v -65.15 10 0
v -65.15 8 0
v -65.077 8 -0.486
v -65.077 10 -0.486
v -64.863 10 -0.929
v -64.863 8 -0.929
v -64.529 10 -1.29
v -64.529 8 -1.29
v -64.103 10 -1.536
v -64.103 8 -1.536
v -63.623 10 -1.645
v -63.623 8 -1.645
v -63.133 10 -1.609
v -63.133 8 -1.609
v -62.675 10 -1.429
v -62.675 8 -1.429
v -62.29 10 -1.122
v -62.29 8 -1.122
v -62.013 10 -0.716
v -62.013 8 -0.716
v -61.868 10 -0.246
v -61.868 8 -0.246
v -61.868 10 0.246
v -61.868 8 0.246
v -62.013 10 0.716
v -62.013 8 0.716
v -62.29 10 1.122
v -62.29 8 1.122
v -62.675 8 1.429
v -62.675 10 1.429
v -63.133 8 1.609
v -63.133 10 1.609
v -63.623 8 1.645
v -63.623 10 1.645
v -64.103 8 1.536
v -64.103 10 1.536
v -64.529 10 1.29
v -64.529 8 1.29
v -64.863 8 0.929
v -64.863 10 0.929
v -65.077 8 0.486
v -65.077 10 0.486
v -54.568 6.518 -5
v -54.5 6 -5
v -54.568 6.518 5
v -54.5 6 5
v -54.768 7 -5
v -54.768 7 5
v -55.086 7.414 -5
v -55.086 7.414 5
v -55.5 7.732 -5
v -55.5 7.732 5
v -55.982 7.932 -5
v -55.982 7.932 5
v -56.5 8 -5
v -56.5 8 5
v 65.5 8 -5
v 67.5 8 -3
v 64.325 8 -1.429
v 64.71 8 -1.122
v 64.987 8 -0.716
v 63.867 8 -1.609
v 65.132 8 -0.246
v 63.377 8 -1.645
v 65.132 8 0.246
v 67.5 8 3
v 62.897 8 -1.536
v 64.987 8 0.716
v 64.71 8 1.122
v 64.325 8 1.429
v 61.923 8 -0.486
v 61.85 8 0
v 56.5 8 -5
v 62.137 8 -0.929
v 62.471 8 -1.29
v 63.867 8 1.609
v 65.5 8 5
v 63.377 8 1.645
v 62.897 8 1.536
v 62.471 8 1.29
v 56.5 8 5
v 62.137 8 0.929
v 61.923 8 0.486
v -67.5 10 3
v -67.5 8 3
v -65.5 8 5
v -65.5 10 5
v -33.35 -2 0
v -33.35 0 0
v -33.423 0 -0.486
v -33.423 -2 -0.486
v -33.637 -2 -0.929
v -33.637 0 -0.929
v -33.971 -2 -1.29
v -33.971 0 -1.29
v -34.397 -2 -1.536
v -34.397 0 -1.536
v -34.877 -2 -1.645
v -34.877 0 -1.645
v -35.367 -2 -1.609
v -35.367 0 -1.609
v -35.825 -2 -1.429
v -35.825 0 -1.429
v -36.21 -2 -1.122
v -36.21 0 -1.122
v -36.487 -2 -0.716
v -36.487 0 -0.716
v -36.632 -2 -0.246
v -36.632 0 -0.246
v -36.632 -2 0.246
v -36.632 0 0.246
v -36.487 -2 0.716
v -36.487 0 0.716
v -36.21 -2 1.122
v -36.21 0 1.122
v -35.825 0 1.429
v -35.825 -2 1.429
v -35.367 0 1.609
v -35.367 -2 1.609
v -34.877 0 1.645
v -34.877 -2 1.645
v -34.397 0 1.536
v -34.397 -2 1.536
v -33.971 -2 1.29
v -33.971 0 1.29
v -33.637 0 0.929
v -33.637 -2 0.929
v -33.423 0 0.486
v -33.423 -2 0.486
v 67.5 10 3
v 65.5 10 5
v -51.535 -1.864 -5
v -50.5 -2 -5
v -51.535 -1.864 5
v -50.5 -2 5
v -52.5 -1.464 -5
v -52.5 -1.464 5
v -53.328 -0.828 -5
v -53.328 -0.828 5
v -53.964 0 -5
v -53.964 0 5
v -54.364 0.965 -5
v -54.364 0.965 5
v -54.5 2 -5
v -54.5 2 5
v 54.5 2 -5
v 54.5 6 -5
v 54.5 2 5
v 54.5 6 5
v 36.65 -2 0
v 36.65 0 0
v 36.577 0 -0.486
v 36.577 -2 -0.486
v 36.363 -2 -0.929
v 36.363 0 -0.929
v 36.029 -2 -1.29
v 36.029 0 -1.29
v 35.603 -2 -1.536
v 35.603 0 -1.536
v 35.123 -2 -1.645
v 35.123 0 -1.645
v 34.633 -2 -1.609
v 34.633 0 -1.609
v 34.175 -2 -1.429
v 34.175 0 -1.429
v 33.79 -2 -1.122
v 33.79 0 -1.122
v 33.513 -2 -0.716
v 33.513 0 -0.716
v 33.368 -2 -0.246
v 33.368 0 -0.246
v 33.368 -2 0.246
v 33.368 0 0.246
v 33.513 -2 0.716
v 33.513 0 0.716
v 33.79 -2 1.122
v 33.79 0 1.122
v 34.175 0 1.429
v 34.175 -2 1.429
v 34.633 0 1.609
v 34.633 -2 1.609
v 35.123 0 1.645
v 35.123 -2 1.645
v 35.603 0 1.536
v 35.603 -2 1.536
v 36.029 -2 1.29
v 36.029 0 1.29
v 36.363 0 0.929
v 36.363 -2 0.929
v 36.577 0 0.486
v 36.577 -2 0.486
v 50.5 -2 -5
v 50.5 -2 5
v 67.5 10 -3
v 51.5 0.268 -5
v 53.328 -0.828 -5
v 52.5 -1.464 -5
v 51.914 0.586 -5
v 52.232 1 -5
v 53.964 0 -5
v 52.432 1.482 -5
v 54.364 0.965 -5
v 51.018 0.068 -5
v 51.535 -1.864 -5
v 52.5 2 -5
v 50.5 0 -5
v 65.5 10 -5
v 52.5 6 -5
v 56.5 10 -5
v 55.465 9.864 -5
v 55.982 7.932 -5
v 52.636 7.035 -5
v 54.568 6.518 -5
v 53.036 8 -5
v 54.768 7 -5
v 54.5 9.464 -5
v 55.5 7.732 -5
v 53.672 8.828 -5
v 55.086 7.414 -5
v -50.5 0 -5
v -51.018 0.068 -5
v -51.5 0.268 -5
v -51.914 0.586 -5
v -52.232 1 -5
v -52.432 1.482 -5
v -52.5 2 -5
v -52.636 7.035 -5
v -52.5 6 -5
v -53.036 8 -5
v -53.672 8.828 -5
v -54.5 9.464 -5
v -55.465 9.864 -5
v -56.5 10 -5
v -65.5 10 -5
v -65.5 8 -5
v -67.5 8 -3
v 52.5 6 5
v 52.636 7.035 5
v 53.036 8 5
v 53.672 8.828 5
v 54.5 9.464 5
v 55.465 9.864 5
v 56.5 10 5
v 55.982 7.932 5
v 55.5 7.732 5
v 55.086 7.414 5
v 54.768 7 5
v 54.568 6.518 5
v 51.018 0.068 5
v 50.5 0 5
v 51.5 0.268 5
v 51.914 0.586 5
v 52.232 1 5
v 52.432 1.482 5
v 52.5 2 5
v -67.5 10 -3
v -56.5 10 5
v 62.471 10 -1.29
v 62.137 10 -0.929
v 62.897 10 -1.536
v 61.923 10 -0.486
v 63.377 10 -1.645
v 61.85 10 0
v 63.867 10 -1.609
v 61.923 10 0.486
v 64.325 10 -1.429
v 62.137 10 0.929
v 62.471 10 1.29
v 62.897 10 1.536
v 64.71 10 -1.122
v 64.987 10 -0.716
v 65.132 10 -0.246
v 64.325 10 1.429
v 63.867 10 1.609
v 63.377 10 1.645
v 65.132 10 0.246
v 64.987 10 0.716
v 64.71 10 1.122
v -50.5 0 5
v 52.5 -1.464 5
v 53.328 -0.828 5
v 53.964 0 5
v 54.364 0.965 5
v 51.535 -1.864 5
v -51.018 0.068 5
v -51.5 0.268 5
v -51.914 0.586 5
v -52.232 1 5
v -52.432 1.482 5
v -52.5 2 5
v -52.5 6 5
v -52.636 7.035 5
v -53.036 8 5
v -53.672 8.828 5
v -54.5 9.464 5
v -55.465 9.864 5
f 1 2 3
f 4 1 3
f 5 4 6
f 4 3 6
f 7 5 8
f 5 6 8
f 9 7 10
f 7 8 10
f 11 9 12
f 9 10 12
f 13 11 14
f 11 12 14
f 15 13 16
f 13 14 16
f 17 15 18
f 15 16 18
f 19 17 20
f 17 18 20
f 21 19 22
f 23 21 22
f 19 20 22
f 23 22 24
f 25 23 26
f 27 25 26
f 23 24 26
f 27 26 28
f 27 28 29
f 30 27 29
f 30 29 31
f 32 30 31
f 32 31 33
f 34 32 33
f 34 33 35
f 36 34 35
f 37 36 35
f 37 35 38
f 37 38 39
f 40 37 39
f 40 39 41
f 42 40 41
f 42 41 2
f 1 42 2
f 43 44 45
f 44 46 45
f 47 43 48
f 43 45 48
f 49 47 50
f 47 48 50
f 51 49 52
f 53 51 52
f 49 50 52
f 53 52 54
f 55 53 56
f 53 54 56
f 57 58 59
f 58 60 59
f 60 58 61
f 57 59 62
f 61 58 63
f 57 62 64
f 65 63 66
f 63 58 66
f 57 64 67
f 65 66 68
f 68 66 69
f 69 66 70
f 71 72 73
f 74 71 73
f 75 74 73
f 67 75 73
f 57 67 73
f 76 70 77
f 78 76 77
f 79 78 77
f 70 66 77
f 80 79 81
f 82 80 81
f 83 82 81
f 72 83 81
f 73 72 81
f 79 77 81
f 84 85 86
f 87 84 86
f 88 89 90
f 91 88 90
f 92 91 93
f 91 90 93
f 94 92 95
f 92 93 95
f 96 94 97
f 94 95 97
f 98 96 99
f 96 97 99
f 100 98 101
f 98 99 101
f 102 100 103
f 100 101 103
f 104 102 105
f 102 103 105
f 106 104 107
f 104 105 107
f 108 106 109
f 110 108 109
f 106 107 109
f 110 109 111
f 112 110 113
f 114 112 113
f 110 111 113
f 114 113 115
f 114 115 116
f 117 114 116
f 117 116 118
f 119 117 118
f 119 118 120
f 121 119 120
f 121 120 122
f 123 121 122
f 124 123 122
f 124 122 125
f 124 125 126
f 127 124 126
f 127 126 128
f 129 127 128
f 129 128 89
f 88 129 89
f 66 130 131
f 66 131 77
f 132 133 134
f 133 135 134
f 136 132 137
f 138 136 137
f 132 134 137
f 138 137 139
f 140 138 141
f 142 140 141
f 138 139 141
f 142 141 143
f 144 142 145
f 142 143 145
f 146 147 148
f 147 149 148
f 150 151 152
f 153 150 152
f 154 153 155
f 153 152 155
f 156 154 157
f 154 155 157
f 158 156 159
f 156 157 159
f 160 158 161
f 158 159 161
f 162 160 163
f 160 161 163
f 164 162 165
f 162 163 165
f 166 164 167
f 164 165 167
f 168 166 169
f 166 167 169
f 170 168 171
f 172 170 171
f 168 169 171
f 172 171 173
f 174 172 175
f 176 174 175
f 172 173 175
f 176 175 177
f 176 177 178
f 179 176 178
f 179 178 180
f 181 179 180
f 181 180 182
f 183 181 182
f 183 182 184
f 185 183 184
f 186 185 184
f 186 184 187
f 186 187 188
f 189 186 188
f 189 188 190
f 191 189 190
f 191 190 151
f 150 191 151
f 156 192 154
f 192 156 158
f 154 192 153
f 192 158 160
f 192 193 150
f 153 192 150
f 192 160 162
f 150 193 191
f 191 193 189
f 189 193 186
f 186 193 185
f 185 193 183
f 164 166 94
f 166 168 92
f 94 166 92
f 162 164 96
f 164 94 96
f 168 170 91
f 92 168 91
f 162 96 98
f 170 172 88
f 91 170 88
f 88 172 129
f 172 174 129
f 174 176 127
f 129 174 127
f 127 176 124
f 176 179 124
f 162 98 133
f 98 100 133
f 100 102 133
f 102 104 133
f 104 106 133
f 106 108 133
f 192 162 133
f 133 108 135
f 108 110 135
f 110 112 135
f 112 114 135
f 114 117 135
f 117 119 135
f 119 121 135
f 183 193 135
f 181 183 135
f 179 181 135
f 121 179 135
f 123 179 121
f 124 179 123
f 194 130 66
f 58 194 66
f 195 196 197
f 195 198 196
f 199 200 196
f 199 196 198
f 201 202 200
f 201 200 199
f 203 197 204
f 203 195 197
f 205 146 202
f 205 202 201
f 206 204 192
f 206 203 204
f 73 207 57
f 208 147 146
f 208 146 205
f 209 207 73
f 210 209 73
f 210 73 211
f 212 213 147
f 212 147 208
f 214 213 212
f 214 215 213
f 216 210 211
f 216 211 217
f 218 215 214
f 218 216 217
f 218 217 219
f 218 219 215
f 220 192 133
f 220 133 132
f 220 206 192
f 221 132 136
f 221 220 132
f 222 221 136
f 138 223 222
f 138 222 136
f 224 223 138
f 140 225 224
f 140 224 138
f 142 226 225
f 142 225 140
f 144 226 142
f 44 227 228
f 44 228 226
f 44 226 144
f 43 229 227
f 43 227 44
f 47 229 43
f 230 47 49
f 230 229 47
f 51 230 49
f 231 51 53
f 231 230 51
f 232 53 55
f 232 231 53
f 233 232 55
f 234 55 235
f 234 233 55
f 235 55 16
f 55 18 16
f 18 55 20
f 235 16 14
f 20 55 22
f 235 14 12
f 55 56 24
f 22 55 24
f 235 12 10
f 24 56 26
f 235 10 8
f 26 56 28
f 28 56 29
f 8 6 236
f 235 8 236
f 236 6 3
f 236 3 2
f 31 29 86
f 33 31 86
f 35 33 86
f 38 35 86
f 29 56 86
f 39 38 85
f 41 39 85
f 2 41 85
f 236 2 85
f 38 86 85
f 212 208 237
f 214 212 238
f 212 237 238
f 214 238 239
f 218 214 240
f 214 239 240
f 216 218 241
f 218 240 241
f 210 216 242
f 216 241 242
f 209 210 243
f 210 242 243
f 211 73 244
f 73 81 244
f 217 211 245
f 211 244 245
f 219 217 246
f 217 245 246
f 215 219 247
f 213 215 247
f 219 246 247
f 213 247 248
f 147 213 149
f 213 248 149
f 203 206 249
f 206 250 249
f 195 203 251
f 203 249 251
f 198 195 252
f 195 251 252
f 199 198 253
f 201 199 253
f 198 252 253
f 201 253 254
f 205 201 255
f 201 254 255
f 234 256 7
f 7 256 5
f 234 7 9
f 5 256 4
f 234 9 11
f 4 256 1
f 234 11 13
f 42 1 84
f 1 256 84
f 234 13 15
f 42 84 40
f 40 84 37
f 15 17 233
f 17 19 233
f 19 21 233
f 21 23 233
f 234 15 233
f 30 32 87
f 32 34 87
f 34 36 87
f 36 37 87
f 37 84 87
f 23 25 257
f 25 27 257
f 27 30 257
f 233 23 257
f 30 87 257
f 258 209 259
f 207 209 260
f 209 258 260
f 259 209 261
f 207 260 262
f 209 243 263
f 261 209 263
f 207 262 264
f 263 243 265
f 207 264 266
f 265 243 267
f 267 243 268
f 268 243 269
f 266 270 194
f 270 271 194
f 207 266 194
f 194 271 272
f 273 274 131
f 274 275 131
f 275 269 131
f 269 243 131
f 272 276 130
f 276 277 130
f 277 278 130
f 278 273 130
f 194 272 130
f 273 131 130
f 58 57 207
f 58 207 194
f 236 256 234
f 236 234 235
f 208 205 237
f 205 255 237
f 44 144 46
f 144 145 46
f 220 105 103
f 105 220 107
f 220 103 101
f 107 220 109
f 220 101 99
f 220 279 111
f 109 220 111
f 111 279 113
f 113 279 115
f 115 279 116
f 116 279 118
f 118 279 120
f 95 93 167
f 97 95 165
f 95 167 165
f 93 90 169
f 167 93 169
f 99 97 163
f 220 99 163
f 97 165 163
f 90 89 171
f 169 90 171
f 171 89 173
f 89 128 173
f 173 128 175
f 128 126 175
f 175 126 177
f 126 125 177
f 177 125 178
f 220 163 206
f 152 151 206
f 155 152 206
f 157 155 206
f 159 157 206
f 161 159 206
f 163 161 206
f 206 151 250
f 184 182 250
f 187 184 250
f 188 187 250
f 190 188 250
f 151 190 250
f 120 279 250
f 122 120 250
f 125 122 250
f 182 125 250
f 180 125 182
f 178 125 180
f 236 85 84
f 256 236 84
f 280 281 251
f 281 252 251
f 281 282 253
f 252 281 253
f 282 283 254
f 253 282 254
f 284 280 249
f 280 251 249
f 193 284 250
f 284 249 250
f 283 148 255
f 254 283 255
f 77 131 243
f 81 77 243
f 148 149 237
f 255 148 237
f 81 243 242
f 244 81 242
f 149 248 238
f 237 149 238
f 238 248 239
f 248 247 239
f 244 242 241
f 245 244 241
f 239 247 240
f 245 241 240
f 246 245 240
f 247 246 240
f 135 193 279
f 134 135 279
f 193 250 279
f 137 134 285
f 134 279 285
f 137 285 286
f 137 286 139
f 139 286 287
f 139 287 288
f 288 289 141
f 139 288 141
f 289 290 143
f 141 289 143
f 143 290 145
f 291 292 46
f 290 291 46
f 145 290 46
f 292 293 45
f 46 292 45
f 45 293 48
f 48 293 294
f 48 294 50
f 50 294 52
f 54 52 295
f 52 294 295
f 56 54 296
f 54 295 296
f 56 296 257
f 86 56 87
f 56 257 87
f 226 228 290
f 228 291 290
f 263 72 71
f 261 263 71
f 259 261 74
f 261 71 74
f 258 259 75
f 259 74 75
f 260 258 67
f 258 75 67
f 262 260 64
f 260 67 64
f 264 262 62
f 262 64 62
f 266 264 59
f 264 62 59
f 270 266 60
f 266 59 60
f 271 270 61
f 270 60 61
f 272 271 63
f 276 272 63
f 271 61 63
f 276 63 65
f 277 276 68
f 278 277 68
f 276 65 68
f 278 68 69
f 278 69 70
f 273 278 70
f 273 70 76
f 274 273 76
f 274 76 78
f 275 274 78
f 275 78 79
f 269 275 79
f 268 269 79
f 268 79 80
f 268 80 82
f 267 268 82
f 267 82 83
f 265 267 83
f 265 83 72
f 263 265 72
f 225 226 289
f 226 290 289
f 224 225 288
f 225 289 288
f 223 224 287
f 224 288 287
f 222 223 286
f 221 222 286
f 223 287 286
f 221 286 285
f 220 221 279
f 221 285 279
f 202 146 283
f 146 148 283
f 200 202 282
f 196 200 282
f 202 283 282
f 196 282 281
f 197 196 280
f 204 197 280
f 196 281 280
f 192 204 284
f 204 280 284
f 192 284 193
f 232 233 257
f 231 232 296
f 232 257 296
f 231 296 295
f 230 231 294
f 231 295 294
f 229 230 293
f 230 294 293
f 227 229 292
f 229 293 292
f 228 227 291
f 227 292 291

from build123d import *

# Parameters (mm, degrees)
FLANGE_BASE1_DEPTH        = 5
FURO_ROSCADO_DE_M41_D     = 3.3
FURO_ROSCADO_DE_M42_D     = 3.3
QUEBRA_CANTO1_START       = -51.265241636
QUEBRA_CANTO1_OUTLINE_W   = 99.702056148
QUEBRA_CANTO1_OUTLINE_H   = 4
QUEBRA_CANTO1_DEPTH       = 1.414213562
QUEBRA_CANTO1_START_2     = 49.851028074
QUEBRA_CANTO1_2_OUTLINE_W = 99.702056148
QUEBRA_CANTO1_2_OUTLINE_H = 4
QUEBRA_CANTO1_2_DEPTH     = 1.414213562
QUEBRA_CANTO1_START_3     = -45.608387387
QUEBRA_CANTO1_3_OUTLINE_W = 2.148971926
QUEBRA_CANTO1_3_OUTLINE_H = 4
QUEBRA_CANTO1_3_DEPTH     = 91.216774774


# Read off the part's stored shape, not the designer's step: Quebra-Canto1
# Sheet-metal steps are written as plain solids
with BuildPart() as part:
    # Esboço1 → Flange-base1 (new, symmetric)
    with BuildSketch(Plane.XY):
        with BuildLine():
            Line((-67.5, 10), (-56.5, 10))
            ThreePointArc((-56.5, 10), (-53.671572875, 8.828427125), (-52.5, 6))
            Line((-52.5, 6), (-52.5, 2))
            ThreePointArc((-52.5, 2), (-51.914213562, 0.585786438), (-50.5, 0))
            Line((-50.5, 0), (50.5, 0))
            ThreePointArc((50.5, 0), (51.914213562, 0.585786438), (52.5, 2))
            Line((52.5, 2), (52.5, 6))
            ThreePointArc((52.5, 6), (53.671572875, 8.828427125), (56.5, 10))
            Line((56.5, 10), (67.5, 10))
            Line((67.5, 10), (67.5, 8))
            Line((67.5, 8), (56.5, 8))
            ThreePointArc((56.5, 8), (55.085786438, 7.414213562), (54.5, 6))
            Line((54.5, 6), (54.5, 2))
            ThreePointArc((54.5, 2), (53.328427125, -0.828427125), (50.5, -2))
            Line((50.5, -2), (-50.5, -2))
            ThreePointArc((-50.5, -2), (-53.328427125, -0.828427125), (-54.5, 2))
            Line((-54.5, 2), (-54.5, 6))
            ThreePointArc((-54.5, 6), (-55.085786438, 7.414213562), (-56.5, 8))
            Line((-56.5, 8), (-67.5, 8))
            Line((-67.5, 8), (-67.5, 10))
        make_face()
    extrude(amount=FLANGE_BASE1_DEPTH, both=True)

    # Furo roscado de M41 (through all)
    with Locations(Plane(origin=(0, -2, 0), x_dir=(-1, 0, 0), z_dir=(0, -1, 0))):
        with Locations((35, 0), (-35, 0)):
            Hole(FURO_ROSCADO_DE_M41_D / 2)

    # Furo roscado de M42 (through all)
    with Locations(Plane(origin=(0, 10, 0), x_dir=(1, 0, 0), z_dir=(0, 1, 0))):
        with Locations((-63.5, 0), (63.5, 0)):
            Hole(FURO_ROSCADO_DE_M42_D / 2)

    # Quebra-Canto1 outline → Quebra-Canto1 (cut)
    with BuildSketch(Plane(origin=(0, 0, 0), x_dir=(0.707106781186548, 0, 0.707106781186547), z_dir=(0.707106781186547, 0, -0.707106781186548)).offset(QUEBRA_CANTO1_START)):
        with Locations((0, -9)):
            Rectangle(QUEBRA_CANTO1_OUTLINE_W, QUEBRA_CANTO1_OUTLINE_H)
    extrude(amount=QUEBRA_CANTO1_DEPTH, mode=Mode.SUBTRACT)

    # Quebra-Canto1 2 outline → Quebra-Canto1 2 (cut)
    with BuildSketch(Plane(origin=(0, 0, 0), x_dir=(0.707106781186548, 0, 0.707106781186547), z_dir=(0.707106781186547, 0, -0.707106781186548)).offset(QUEBRA_CANTO1_START_2)):
        with Locations((0, -9)):
            Rectangle(QUEBRA_CANTO1_2_OUTLINE_W, QUEBRA_CANTO1_2_OUTLINE_H)
    extrude(amount=QUEBRA_CANTO1_2_DEPTH, mode=Mode.SUBTRACT)

    # Quebra-Canto1 3 outline → Quebra-Canto1 3 (cut)
    with BuildSketch(Plane(origin=(0, 0, 0), x_dir=(0.707106781186548, 0, 0.707106781186547), z_dir=(0.707106781186547, 0, -0.707106781186548)).offset(QUEBRA_CANTO1_START_3)):
        with Locations((-50.925514037, -9)):
            Rectangle(QUEBRA_CANTO1_3_OUTLINE_W, QUEBRA_CANTO1_3_OUTLINE_H)
        with Locations((50.925514037, -9)):
            Rectangle(QUEBRA_CANTO1_3_OUTLINE_W, QUEBRA_CANTO1_3_OUTLINE_H)
    extrude(amount=QUEBRA_CANTO1_3_DEPTH, mode=Mode.SUBTRACT)


solid = part.part
